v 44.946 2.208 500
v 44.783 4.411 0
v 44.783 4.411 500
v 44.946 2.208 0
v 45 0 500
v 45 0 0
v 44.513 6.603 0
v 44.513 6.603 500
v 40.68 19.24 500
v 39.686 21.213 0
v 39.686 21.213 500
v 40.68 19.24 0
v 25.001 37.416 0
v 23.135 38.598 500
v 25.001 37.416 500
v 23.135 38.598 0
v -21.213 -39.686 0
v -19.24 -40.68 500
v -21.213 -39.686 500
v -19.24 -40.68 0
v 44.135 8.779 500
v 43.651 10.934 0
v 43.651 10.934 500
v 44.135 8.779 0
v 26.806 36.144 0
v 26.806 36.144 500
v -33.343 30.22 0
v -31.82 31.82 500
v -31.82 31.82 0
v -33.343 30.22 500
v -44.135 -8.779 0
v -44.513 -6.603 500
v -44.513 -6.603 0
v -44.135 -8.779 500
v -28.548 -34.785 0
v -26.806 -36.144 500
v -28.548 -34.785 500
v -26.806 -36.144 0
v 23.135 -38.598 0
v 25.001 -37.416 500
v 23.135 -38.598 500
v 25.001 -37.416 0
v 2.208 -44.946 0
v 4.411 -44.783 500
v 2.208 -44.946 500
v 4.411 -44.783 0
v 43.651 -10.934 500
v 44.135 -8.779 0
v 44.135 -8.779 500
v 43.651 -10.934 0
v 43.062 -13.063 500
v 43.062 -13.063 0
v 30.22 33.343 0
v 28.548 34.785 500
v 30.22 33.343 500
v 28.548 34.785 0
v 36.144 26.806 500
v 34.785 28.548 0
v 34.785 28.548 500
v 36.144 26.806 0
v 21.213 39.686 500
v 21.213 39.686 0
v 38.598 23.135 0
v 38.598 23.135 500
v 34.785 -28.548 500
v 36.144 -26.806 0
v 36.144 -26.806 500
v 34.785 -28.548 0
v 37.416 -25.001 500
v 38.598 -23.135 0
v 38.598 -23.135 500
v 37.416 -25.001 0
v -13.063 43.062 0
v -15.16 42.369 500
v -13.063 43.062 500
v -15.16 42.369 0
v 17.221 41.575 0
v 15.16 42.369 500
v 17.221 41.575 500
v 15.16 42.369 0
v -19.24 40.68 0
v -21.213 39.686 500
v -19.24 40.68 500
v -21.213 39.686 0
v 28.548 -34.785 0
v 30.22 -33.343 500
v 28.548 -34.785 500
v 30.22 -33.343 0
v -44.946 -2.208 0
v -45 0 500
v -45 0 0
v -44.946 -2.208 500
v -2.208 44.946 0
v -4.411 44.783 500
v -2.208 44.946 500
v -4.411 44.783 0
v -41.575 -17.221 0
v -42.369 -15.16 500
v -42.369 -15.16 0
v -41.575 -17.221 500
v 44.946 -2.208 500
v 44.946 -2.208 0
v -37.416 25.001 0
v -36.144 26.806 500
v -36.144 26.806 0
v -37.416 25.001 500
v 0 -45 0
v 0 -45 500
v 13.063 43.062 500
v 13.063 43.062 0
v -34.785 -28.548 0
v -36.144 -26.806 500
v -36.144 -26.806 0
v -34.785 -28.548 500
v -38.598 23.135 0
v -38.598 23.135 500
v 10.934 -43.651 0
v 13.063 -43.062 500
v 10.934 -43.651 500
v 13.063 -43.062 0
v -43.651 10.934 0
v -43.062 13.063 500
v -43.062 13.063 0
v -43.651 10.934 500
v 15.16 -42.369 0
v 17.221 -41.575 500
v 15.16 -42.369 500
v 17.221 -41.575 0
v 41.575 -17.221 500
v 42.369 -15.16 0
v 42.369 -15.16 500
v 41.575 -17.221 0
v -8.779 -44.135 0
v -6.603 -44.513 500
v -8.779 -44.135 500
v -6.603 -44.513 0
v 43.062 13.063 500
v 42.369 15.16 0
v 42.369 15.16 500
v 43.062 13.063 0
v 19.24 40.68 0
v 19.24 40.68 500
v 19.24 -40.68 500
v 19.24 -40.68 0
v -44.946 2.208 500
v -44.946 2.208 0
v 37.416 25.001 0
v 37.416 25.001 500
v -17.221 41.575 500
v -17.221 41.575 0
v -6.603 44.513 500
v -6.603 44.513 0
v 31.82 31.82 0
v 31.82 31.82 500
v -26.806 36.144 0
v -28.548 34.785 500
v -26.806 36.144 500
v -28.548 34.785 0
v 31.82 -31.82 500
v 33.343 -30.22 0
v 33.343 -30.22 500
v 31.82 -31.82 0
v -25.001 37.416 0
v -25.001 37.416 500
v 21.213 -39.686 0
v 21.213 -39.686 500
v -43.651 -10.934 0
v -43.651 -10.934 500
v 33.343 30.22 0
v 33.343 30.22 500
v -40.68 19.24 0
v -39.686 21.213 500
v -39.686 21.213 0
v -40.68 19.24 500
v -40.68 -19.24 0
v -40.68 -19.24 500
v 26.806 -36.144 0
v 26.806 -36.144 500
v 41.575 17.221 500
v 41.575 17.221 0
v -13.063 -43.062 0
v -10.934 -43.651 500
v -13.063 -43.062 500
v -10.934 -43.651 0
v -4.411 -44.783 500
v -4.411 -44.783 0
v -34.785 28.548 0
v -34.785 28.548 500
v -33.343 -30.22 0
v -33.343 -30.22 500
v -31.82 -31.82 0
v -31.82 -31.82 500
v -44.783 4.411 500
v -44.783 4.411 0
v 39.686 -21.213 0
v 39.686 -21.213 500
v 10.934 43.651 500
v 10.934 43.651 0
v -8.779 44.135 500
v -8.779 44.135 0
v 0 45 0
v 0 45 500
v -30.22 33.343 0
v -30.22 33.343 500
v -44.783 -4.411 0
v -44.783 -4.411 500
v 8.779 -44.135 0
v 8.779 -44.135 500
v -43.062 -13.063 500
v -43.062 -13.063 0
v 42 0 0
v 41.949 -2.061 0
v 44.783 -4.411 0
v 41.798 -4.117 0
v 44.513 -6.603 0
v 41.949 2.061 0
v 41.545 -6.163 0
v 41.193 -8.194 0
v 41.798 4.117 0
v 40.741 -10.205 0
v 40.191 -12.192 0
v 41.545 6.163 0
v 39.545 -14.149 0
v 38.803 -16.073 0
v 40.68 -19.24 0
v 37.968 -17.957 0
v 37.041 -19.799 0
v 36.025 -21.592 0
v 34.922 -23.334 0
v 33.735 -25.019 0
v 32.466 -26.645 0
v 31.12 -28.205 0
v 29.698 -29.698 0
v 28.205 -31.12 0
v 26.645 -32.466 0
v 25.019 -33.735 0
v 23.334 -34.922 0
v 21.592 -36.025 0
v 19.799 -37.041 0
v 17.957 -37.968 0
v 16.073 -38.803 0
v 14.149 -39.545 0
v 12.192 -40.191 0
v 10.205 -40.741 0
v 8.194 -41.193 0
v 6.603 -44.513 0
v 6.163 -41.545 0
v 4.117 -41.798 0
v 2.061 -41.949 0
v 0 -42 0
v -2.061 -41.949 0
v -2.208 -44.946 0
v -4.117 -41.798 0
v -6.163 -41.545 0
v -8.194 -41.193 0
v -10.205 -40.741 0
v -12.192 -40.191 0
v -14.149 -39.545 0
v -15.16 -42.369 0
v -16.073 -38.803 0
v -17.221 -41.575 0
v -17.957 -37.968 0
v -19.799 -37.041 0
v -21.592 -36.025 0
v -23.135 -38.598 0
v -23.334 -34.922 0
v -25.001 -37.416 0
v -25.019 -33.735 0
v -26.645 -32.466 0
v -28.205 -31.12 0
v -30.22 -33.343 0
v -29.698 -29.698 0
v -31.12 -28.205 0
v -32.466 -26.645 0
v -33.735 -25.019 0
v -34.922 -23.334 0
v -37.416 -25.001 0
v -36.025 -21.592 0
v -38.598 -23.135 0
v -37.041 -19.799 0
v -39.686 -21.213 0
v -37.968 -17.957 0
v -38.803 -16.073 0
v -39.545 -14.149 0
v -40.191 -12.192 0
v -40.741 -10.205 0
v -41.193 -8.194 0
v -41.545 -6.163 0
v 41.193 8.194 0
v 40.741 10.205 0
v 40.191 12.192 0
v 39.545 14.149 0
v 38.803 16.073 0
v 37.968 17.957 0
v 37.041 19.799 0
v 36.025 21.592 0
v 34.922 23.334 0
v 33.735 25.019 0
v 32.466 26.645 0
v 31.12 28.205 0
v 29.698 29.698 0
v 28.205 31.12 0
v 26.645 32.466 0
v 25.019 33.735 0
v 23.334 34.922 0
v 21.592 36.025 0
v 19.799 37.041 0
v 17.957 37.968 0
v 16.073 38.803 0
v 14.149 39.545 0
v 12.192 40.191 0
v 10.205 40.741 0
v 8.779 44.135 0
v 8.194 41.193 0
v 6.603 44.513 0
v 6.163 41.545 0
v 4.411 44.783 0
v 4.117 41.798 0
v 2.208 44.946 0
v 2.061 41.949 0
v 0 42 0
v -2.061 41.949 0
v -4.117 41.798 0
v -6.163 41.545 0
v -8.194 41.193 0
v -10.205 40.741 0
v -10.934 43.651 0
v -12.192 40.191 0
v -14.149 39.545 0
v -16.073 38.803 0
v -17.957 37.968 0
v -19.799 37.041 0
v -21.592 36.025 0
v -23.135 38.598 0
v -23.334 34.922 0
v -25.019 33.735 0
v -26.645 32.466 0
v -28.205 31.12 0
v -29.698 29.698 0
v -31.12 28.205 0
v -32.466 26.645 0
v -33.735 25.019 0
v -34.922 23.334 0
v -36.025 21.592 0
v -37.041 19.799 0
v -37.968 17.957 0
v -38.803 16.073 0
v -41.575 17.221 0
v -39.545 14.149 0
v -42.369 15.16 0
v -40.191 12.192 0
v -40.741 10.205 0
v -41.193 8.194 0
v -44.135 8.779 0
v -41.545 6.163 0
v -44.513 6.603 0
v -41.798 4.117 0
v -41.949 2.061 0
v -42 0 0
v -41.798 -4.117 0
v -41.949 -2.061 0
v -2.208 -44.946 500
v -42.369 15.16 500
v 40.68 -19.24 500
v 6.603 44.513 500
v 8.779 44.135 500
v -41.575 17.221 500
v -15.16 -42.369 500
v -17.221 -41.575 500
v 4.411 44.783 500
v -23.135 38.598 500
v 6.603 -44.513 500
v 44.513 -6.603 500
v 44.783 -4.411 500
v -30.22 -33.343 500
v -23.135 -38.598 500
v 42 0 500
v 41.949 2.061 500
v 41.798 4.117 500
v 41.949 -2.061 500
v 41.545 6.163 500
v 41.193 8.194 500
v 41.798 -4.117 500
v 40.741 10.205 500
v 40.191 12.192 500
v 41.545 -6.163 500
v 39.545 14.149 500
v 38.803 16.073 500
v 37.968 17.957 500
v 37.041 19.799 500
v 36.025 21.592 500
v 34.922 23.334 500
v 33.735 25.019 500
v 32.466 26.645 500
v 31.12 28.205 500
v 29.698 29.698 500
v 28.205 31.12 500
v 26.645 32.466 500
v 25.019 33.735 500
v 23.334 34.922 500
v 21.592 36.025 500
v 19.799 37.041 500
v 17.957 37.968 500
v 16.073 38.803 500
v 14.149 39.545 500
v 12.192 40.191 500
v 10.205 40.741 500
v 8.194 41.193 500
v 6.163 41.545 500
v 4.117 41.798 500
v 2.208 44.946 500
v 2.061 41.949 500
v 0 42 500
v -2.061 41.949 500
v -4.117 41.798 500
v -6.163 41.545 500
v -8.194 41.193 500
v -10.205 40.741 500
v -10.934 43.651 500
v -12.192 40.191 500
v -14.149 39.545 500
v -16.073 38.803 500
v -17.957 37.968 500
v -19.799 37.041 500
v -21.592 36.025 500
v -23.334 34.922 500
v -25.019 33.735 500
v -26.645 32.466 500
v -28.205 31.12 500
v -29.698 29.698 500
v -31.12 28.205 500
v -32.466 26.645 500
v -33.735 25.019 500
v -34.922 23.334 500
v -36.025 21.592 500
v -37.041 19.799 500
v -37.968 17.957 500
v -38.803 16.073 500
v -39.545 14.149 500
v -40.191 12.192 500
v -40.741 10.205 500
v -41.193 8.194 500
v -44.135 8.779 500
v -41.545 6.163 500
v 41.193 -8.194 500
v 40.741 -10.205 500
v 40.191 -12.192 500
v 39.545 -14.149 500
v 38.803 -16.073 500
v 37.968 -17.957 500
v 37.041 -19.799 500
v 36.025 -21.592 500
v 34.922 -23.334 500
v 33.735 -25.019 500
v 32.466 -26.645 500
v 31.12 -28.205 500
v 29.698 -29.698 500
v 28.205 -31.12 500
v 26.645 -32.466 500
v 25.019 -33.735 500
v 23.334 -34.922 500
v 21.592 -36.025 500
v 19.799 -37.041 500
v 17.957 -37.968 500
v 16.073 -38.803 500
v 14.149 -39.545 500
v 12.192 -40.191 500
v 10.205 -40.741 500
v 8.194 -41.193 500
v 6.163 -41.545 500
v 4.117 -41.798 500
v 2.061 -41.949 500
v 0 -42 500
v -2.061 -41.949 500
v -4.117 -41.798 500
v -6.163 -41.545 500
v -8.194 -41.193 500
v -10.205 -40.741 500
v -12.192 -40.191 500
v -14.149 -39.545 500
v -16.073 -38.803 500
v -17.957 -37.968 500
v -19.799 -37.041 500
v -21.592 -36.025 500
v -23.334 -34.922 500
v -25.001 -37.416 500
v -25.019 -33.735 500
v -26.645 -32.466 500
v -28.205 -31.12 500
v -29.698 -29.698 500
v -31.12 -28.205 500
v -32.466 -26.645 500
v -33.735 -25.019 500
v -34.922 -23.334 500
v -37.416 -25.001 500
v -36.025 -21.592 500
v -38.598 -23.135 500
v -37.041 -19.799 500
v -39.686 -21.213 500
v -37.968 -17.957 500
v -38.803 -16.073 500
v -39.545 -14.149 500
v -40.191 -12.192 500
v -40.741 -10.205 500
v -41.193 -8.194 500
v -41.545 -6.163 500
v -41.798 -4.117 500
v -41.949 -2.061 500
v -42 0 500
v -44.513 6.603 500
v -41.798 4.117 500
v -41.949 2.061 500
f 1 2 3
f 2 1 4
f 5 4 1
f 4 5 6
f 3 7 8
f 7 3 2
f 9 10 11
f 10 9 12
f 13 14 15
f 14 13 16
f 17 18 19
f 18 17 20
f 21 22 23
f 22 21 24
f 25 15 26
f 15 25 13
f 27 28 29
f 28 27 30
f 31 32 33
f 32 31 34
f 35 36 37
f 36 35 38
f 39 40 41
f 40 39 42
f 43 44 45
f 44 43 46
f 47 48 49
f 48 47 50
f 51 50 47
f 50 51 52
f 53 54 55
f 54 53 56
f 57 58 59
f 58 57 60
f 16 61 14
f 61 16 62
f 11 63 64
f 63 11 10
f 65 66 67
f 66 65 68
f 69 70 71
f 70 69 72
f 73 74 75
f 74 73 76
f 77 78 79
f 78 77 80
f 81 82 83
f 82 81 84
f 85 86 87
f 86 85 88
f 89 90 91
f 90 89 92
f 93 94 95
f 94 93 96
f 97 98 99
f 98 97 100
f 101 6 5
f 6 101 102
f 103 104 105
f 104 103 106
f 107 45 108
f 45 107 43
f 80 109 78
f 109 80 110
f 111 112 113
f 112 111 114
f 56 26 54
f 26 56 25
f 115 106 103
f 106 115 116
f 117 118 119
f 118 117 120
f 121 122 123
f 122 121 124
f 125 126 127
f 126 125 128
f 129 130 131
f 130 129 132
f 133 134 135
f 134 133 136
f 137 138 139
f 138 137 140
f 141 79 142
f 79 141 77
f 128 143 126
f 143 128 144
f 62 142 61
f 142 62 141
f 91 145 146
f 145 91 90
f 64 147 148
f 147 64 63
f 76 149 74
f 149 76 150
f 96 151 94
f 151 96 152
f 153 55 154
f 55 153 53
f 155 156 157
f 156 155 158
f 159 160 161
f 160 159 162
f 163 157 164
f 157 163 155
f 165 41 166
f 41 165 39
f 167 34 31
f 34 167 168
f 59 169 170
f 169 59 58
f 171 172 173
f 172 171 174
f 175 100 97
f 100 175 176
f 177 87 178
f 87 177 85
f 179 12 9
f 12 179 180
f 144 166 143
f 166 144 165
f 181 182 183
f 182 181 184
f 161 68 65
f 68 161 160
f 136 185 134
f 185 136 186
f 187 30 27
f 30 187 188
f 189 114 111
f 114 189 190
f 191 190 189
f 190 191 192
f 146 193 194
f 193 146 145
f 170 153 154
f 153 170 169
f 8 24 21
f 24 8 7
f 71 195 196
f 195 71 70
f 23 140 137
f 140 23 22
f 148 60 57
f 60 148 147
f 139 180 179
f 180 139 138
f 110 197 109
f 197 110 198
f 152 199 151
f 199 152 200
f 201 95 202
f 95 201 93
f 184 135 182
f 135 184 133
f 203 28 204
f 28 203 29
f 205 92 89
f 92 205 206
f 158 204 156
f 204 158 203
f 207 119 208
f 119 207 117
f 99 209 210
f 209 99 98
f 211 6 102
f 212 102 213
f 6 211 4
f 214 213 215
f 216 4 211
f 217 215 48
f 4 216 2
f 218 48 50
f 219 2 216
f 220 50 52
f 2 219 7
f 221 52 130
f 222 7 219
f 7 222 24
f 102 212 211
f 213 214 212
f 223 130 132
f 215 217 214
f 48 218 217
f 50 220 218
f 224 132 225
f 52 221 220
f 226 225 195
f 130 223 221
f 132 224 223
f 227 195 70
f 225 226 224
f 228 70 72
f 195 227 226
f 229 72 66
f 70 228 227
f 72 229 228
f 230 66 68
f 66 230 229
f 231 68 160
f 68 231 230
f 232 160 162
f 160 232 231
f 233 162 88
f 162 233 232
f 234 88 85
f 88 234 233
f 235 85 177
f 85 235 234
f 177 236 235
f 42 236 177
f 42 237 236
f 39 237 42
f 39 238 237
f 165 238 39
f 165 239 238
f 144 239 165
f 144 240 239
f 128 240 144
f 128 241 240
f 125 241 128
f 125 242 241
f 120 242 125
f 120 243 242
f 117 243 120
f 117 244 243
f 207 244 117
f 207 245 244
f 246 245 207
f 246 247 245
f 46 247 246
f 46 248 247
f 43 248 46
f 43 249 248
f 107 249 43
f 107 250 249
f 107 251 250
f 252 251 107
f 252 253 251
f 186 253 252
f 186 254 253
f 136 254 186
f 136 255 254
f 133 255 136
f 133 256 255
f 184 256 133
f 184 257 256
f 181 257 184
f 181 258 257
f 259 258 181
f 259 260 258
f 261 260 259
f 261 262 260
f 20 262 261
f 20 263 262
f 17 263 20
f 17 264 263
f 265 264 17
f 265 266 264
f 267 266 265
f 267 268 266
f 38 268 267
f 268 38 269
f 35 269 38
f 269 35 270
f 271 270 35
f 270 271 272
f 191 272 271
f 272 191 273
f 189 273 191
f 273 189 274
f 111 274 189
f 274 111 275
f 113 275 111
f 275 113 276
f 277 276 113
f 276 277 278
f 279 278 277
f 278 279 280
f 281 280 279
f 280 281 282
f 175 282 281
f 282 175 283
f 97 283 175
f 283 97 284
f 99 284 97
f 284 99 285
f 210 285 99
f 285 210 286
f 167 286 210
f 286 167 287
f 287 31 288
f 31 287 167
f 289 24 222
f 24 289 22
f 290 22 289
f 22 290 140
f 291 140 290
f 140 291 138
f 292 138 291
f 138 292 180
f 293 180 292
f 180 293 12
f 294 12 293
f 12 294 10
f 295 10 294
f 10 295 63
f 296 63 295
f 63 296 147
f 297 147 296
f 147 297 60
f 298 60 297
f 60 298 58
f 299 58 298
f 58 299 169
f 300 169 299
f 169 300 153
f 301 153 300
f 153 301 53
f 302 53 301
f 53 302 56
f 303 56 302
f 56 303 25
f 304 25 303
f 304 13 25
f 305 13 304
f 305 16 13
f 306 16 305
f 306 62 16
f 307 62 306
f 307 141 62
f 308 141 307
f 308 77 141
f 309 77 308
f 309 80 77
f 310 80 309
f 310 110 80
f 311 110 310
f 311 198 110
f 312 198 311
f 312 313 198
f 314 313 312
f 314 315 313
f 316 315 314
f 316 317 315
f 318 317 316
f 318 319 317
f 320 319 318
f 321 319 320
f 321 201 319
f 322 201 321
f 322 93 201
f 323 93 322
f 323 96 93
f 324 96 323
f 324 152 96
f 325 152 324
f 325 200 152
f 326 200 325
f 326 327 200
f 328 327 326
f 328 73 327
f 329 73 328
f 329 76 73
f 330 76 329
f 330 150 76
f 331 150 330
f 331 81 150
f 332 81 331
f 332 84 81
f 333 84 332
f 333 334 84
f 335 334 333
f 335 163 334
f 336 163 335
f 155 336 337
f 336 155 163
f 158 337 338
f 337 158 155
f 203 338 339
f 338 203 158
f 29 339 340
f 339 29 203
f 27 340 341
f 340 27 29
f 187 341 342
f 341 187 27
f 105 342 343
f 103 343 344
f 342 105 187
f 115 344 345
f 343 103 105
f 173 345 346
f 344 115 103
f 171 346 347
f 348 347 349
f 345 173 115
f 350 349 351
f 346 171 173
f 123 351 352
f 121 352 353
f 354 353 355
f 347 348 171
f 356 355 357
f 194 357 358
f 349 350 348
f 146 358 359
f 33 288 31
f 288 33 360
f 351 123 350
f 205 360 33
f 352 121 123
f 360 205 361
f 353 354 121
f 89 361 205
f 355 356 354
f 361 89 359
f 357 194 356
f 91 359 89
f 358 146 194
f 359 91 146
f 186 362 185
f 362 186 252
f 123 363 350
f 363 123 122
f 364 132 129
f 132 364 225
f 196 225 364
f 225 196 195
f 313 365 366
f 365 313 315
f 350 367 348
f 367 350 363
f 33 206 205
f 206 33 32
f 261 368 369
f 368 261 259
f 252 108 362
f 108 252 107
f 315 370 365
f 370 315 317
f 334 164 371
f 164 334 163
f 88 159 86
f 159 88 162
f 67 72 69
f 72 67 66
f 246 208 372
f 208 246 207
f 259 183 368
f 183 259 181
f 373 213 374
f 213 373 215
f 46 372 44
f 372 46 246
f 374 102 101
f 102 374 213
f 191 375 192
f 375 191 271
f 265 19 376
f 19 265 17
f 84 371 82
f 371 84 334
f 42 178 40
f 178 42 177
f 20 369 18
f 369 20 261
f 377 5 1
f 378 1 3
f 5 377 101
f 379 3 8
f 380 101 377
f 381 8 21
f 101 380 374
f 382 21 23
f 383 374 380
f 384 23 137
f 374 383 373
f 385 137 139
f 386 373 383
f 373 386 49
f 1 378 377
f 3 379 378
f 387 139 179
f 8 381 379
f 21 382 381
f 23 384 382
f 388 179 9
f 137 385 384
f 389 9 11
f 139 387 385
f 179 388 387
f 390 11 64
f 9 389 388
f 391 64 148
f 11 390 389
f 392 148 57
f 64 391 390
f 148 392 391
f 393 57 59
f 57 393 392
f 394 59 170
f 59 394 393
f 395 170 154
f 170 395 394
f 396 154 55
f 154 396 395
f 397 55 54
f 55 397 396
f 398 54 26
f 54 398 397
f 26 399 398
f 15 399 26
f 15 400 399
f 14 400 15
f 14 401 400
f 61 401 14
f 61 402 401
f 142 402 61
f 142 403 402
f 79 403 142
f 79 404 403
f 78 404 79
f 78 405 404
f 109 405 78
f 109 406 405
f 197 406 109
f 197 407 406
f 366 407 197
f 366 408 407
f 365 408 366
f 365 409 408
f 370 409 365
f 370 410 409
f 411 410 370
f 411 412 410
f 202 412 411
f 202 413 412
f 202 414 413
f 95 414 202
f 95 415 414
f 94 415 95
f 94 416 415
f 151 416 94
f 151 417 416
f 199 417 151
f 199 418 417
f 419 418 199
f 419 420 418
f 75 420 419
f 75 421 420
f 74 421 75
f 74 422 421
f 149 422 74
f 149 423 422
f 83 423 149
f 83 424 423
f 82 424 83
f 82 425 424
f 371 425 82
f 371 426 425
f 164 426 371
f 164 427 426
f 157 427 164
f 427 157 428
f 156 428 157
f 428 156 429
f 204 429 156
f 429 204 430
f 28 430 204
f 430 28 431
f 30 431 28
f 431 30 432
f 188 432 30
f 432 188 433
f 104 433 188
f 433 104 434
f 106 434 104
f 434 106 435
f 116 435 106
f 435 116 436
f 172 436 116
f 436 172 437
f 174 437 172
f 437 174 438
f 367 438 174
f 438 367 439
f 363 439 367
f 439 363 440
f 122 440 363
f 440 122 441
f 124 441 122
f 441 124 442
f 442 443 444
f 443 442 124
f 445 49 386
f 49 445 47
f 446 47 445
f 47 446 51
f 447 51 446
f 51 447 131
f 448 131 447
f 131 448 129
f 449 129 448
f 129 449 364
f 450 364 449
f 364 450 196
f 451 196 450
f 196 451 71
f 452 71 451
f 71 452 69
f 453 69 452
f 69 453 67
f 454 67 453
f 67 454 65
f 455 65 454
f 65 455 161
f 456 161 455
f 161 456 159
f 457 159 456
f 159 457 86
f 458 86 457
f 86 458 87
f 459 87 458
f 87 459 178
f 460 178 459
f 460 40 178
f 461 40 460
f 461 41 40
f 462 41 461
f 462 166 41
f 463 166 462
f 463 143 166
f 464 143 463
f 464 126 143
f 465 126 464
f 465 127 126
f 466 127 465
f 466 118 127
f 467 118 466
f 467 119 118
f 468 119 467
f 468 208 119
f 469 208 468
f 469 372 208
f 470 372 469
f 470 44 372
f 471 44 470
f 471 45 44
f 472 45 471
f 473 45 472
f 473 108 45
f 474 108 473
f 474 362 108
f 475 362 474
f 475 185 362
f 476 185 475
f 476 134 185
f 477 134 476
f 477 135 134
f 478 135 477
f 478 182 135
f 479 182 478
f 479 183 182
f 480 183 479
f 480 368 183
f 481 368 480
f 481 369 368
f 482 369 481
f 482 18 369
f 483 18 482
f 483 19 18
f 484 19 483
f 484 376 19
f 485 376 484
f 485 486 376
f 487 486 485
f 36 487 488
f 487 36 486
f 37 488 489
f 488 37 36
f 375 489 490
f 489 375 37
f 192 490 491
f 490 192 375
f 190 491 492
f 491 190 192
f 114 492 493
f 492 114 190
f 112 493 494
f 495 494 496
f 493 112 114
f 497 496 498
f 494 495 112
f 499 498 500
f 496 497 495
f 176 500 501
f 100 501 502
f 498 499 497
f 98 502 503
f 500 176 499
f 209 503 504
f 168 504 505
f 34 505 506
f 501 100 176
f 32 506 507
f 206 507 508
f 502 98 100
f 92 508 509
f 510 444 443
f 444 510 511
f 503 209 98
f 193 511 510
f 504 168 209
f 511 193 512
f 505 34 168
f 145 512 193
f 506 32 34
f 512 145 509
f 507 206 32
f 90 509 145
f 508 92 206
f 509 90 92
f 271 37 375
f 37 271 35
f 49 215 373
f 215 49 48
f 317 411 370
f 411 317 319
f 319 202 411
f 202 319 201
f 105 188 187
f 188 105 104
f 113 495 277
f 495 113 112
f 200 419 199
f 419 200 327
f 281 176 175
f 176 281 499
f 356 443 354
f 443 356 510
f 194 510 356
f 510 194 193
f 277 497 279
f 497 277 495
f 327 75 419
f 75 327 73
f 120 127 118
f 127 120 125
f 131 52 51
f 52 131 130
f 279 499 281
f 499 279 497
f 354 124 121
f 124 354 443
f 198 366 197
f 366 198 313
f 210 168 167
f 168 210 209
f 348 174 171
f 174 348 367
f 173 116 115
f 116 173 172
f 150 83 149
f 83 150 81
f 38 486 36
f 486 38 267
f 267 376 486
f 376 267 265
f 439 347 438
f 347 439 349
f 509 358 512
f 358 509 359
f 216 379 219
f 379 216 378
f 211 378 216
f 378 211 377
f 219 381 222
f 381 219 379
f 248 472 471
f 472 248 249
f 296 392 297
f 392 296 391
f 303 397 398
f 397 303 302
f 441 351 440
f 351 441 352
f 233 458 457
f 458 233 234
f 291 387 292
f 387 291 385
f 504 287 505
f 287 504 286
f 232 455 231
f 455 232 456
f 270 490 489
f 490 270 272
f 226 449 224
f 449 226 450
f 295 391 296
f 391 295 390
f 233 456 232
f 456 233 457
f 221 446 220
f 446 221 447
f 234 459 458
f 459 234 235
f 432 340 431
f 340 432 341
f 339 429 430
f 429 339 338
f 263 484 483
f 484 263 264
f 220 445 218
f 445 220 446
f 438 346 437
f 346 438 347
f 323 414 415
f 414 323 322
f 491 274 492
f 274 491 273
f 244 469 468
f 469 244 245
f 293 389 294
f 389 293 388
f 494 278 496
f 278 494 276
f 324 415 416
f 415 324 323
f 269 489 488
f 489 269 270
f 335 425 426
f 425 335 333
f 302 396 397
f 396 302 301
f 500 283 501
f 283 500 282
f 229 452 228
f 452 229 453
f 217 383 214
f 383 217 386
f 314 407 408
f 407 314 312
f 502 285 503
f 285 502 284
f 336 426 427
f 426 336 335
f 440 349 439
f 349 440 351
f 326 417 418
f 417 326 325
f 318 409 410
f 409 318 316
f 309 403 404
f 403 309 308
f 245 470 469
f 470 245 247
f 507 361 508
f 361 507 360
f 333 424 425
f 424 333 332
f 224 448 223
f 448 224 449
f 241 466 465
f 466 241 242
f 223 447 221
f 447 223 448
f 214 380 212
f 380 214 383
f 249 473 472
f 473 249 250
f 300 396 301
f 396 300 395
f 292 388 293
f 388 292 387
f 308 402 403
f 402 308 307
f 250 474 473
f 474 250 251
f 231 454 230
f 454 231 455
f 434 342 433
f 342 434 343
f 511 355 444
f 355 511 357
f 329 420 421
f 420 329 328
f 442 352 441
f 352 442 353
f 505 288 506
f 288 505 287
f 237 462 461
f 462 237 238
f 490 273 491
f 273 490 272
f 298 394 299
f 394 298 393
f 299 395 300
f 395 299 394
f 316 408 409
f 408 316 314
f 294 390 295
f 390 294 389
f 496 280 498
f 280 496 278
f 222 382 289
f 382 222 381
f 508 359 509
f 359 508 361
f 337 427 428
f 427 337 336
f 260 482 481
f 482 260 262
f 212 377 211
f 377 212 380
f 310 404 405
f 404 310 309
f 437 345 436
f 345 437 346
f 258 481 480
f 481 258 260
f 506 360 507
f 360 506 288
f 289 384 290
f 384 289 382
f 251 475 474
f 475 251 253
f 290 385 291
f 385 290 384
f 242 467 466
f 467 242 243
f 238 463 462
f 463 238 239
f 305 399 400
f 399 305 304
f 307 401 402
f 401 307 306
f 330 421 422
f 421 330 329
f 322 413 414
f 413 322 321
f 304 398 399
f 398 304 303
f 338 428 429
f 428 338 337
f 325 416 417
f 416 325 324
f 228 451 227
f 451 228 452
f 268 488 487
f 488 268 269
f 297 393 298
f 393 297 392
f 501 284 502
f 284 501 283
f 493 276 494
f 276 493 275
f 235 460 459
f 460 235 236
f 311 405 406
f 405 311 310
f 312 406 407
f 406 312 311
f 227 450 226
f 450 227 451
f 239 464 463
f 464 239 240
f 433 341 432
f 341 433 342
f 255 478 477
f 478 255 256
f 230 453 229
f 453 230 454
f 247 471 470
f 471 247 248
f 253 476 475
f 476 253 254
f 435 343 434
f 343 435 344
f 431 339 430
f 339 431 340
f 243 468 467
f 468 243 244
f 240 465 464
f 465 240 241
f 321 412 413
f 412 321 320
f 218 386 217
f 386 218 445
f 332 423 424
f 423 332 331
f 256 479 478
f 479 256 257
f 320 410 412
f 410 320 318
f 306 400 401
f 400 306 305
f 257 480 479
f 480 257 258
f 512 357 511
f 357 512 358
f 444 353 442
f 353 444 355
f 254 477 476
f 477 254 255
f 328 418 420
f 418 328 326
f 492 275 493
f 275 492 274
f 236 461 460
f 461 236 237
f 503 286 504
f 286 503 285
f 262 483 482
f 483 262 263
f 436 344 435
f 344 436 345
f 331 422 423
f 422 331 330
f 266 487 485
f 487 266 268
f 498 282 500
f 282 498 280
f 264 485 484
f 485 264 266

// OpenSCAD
$fn = 128;

// HT 90 pipe 500 mm (approximation)
// Dimensions in mm
pipe_od = 90;        // outer diameter
pipe_id = 84;        // inner diameter (approx. 3 mm wall)
pipe_len = 500;

module ht_pipe(od, id, len) {
    difference() {
        cylinder(h = len, d = od, center = false);
        translate([0,0,-0.1]) cylinder(h = len + 0.2, d = id, center = false);
    }
}

ht_pipe(pipe_od, pipe_id, pipe_len);
